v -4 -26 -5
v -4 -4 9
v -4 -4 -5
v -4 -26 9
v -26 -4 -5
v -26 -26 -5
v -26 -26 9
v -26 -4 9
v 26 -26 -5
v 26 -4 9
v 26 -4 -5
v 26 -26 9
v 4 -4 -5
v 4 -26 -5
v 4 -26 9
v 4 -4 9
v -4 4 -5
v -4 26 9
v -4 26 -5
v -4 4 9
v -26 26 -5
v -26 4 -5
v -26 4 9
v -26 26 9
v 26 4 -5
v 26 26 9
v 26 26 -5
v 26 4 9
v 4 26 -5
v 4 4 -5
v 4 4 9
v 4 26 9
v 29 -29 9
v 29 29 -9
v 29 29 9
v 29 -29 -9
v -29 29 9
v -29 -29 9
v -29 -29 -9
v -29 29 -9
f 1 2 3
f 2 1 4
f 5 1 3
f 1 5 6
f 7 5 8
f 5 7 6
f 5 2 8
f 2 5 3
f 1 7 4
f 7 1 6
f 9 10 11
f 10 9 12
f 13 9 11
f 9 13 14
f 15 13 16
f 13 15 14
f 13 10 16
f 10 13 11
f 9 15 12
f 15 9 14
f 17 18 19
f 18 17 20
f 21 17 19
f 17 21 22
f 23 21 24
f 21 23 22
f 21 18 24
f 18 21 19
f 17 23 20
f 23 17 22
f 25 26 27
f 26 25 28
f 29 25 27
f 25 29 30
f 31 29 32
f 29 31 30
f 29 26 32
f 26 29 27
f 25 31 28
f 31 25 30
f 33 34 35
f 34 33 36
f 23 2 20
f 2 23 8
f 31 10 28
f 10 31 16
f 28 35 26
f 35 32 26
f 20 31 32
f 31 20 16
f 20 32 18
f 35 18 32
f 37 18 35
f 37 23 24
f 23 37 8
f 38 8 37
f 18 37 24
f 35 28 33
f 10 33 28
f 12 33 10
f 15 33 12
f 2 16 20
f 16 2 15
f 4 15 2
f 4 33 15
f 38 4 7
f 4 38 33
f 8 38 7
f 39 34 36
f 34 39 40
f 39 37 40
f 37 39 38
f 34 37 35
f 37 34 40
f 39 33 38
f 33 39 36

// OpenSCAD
$fn = 32;

// ----------------------------------------------------------------------
// Pocket plate 58 x 58 x 18
// 2 x 2 pockets 22 mm square, 14 mm deep
// ----------------------------------------------------------------------

// --- parameters (mm) ---
thickness = 18;  // plate thickness
floor_t = 4;     // material left under each pocket
pocket = 22;     // pocket side length
pitch_x = 30;    // pocket pitch along X
pitch_y = 30;    // pocket pitch along Y
cols = 2;        // pockets per row
rows = 2;        // rows of pockets

// --- derived feature positions (mm) ---
depth = thickness - floor_t;        // = 14   pocket depth, down to the floor
span_x = (cols - 1) * pitch_x;      // = 30   distance between outer pockets
span_y = (rows - 1) * pitch_y;      // = 30   distance between outer pocket rows
origin_x = -span_x / 2;             // = -15   X of the first pocket
origin_y = -span_y / 2;             // = -15   Y of the first pocket
plate = [span_x + pocket + 6, span_y + pocket + 6, thickness];  // = [58, 58, 18]   overall size: pockets plus 3 mm of wall on each side
feature_centers = [
  [origin_x + 0 * pitch_x, origin_y + 0 * pitch_y],
  [origin_x + 1 * pitch_x, origin_y + 0 * pitch_y],
  [origin_x + 0 * pitch_x, origin_y + 1 * pitch_y],
  [origin_x + 1 * pitch_x, origin_y + 1 * pitch_y]
];   // pocket centres, used verbatim by the cutter loop

// plate outline, then one pocket per centre in feature_centers
difference() {
  cube(plate, center = true);
  for (centre = feature_centers)
    translate([centre[0] - pocket / 2, centre[1] - pocket / 2, plate[2] / 2 - depth])
      cube([pocket, pocket, depth + 1]);  // centred on the declared pocket centre
}
